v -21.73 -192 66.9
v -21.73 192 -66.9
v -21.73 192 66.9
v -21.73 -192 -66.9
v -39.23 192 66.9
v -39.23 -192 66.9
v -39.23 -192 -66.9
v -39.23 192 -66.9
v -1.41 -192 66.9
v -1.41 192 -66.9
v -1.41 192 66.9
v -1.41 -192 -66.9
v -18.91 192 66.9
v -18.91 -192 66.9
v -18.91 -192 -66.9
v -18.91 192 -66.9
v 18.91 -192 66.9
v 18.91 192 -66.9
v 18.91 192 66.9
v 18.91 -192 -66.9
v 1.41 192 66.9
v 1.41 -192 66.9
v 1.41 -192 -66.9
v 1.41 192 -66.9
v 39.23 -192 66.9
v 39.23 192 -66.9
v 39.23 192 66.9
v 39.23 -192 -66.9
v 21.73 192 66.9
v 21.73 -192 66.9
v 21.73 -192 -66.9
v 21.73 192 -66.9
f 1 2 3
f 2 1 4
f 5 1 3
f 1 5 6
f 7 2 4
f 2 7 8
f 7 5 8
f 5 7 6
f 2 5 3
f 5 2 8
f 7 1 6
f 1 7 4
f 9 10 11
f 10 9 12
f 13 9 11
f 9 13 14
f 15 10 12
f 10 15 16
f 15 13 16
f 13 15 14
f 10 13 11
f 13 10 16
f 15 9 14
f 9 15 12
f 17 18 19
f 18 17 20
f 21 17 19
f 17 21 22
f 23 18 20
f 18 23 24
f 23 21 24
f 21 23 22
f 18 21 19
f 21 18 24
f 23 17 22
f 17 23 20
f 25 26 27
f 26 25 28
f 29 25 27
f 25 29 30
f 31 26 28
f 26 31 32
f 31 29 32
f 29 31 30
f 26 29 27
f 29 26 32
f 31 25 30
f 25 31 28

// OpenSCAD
// ============================================================================
// Atom Lithography Machine — Parametric OpenSCAD Module (S7.2-01)
// ============================================================================
// part_id           : S7.2-01
// parent_bom_id     : S7.2
// subsystem         : S7
// part_name         : Cok-kanalli keyfi dalga formu uretici (AWG) kartlari (GRAPE XY/ENDOR)
// material          : Rogers
// temp_stage        : 300 K (kabin)
// vacuum_grade      : Atmosfer
// tolerance         : 16-bit, <10 ps
// computed_mass_kg  : 3.20000
// envelope_mm       : 78.460 x 393.200 x 133.800
// design_maturity   : M0_M1_DETAILED_CAD_DESIGN_ONLY
// no_lab_measurement: true
// iec61508_certified: false
// semi_s2_certified : false
// Units: millimeters (mm)
// ============================================================================

$fn = 64;

// Nominal bounding envelope parameters (mm)
bbox_x = 78.4600;
bbox_y = 393.2000;
bbox_z = 133.8000;

// Part-specific parametric dimensions
n_cards = 4;
slot_pitch_mm = 20.32;
card_depth_mm = 380.0;

// Interface / port parameters (mm)

module part_S7_2_01() {
  union() {
    // PXIe slot 2 card module
    translate([-30.480, 0.000, 0.000]) cube([17.500, 384.000, 133.800], center=true);
    // PXIe slot 3 card module
    translate([-10.160, 0.000, 0.000]) cube([17.500, 384.000, 133.800], center=true);
    // PXIe slot 4 card module
    translate([10.160, 0.000, 0.000]) cube([17.500, 384.000, 133.800], center=true);
    // PXIe slot 5 card module
    translate([30.480, 0.000, 0.000]) cube([17.500, 384.000, 133.800], center=true);
  }
}

// World assembly mounting transform (global machine frame, mm / deg):
// translate([1378.400, -242.400, 578.950]) rotate([0.000, 0.000, 0.000]) part_S7_2_01();

part_S7_2_01();
